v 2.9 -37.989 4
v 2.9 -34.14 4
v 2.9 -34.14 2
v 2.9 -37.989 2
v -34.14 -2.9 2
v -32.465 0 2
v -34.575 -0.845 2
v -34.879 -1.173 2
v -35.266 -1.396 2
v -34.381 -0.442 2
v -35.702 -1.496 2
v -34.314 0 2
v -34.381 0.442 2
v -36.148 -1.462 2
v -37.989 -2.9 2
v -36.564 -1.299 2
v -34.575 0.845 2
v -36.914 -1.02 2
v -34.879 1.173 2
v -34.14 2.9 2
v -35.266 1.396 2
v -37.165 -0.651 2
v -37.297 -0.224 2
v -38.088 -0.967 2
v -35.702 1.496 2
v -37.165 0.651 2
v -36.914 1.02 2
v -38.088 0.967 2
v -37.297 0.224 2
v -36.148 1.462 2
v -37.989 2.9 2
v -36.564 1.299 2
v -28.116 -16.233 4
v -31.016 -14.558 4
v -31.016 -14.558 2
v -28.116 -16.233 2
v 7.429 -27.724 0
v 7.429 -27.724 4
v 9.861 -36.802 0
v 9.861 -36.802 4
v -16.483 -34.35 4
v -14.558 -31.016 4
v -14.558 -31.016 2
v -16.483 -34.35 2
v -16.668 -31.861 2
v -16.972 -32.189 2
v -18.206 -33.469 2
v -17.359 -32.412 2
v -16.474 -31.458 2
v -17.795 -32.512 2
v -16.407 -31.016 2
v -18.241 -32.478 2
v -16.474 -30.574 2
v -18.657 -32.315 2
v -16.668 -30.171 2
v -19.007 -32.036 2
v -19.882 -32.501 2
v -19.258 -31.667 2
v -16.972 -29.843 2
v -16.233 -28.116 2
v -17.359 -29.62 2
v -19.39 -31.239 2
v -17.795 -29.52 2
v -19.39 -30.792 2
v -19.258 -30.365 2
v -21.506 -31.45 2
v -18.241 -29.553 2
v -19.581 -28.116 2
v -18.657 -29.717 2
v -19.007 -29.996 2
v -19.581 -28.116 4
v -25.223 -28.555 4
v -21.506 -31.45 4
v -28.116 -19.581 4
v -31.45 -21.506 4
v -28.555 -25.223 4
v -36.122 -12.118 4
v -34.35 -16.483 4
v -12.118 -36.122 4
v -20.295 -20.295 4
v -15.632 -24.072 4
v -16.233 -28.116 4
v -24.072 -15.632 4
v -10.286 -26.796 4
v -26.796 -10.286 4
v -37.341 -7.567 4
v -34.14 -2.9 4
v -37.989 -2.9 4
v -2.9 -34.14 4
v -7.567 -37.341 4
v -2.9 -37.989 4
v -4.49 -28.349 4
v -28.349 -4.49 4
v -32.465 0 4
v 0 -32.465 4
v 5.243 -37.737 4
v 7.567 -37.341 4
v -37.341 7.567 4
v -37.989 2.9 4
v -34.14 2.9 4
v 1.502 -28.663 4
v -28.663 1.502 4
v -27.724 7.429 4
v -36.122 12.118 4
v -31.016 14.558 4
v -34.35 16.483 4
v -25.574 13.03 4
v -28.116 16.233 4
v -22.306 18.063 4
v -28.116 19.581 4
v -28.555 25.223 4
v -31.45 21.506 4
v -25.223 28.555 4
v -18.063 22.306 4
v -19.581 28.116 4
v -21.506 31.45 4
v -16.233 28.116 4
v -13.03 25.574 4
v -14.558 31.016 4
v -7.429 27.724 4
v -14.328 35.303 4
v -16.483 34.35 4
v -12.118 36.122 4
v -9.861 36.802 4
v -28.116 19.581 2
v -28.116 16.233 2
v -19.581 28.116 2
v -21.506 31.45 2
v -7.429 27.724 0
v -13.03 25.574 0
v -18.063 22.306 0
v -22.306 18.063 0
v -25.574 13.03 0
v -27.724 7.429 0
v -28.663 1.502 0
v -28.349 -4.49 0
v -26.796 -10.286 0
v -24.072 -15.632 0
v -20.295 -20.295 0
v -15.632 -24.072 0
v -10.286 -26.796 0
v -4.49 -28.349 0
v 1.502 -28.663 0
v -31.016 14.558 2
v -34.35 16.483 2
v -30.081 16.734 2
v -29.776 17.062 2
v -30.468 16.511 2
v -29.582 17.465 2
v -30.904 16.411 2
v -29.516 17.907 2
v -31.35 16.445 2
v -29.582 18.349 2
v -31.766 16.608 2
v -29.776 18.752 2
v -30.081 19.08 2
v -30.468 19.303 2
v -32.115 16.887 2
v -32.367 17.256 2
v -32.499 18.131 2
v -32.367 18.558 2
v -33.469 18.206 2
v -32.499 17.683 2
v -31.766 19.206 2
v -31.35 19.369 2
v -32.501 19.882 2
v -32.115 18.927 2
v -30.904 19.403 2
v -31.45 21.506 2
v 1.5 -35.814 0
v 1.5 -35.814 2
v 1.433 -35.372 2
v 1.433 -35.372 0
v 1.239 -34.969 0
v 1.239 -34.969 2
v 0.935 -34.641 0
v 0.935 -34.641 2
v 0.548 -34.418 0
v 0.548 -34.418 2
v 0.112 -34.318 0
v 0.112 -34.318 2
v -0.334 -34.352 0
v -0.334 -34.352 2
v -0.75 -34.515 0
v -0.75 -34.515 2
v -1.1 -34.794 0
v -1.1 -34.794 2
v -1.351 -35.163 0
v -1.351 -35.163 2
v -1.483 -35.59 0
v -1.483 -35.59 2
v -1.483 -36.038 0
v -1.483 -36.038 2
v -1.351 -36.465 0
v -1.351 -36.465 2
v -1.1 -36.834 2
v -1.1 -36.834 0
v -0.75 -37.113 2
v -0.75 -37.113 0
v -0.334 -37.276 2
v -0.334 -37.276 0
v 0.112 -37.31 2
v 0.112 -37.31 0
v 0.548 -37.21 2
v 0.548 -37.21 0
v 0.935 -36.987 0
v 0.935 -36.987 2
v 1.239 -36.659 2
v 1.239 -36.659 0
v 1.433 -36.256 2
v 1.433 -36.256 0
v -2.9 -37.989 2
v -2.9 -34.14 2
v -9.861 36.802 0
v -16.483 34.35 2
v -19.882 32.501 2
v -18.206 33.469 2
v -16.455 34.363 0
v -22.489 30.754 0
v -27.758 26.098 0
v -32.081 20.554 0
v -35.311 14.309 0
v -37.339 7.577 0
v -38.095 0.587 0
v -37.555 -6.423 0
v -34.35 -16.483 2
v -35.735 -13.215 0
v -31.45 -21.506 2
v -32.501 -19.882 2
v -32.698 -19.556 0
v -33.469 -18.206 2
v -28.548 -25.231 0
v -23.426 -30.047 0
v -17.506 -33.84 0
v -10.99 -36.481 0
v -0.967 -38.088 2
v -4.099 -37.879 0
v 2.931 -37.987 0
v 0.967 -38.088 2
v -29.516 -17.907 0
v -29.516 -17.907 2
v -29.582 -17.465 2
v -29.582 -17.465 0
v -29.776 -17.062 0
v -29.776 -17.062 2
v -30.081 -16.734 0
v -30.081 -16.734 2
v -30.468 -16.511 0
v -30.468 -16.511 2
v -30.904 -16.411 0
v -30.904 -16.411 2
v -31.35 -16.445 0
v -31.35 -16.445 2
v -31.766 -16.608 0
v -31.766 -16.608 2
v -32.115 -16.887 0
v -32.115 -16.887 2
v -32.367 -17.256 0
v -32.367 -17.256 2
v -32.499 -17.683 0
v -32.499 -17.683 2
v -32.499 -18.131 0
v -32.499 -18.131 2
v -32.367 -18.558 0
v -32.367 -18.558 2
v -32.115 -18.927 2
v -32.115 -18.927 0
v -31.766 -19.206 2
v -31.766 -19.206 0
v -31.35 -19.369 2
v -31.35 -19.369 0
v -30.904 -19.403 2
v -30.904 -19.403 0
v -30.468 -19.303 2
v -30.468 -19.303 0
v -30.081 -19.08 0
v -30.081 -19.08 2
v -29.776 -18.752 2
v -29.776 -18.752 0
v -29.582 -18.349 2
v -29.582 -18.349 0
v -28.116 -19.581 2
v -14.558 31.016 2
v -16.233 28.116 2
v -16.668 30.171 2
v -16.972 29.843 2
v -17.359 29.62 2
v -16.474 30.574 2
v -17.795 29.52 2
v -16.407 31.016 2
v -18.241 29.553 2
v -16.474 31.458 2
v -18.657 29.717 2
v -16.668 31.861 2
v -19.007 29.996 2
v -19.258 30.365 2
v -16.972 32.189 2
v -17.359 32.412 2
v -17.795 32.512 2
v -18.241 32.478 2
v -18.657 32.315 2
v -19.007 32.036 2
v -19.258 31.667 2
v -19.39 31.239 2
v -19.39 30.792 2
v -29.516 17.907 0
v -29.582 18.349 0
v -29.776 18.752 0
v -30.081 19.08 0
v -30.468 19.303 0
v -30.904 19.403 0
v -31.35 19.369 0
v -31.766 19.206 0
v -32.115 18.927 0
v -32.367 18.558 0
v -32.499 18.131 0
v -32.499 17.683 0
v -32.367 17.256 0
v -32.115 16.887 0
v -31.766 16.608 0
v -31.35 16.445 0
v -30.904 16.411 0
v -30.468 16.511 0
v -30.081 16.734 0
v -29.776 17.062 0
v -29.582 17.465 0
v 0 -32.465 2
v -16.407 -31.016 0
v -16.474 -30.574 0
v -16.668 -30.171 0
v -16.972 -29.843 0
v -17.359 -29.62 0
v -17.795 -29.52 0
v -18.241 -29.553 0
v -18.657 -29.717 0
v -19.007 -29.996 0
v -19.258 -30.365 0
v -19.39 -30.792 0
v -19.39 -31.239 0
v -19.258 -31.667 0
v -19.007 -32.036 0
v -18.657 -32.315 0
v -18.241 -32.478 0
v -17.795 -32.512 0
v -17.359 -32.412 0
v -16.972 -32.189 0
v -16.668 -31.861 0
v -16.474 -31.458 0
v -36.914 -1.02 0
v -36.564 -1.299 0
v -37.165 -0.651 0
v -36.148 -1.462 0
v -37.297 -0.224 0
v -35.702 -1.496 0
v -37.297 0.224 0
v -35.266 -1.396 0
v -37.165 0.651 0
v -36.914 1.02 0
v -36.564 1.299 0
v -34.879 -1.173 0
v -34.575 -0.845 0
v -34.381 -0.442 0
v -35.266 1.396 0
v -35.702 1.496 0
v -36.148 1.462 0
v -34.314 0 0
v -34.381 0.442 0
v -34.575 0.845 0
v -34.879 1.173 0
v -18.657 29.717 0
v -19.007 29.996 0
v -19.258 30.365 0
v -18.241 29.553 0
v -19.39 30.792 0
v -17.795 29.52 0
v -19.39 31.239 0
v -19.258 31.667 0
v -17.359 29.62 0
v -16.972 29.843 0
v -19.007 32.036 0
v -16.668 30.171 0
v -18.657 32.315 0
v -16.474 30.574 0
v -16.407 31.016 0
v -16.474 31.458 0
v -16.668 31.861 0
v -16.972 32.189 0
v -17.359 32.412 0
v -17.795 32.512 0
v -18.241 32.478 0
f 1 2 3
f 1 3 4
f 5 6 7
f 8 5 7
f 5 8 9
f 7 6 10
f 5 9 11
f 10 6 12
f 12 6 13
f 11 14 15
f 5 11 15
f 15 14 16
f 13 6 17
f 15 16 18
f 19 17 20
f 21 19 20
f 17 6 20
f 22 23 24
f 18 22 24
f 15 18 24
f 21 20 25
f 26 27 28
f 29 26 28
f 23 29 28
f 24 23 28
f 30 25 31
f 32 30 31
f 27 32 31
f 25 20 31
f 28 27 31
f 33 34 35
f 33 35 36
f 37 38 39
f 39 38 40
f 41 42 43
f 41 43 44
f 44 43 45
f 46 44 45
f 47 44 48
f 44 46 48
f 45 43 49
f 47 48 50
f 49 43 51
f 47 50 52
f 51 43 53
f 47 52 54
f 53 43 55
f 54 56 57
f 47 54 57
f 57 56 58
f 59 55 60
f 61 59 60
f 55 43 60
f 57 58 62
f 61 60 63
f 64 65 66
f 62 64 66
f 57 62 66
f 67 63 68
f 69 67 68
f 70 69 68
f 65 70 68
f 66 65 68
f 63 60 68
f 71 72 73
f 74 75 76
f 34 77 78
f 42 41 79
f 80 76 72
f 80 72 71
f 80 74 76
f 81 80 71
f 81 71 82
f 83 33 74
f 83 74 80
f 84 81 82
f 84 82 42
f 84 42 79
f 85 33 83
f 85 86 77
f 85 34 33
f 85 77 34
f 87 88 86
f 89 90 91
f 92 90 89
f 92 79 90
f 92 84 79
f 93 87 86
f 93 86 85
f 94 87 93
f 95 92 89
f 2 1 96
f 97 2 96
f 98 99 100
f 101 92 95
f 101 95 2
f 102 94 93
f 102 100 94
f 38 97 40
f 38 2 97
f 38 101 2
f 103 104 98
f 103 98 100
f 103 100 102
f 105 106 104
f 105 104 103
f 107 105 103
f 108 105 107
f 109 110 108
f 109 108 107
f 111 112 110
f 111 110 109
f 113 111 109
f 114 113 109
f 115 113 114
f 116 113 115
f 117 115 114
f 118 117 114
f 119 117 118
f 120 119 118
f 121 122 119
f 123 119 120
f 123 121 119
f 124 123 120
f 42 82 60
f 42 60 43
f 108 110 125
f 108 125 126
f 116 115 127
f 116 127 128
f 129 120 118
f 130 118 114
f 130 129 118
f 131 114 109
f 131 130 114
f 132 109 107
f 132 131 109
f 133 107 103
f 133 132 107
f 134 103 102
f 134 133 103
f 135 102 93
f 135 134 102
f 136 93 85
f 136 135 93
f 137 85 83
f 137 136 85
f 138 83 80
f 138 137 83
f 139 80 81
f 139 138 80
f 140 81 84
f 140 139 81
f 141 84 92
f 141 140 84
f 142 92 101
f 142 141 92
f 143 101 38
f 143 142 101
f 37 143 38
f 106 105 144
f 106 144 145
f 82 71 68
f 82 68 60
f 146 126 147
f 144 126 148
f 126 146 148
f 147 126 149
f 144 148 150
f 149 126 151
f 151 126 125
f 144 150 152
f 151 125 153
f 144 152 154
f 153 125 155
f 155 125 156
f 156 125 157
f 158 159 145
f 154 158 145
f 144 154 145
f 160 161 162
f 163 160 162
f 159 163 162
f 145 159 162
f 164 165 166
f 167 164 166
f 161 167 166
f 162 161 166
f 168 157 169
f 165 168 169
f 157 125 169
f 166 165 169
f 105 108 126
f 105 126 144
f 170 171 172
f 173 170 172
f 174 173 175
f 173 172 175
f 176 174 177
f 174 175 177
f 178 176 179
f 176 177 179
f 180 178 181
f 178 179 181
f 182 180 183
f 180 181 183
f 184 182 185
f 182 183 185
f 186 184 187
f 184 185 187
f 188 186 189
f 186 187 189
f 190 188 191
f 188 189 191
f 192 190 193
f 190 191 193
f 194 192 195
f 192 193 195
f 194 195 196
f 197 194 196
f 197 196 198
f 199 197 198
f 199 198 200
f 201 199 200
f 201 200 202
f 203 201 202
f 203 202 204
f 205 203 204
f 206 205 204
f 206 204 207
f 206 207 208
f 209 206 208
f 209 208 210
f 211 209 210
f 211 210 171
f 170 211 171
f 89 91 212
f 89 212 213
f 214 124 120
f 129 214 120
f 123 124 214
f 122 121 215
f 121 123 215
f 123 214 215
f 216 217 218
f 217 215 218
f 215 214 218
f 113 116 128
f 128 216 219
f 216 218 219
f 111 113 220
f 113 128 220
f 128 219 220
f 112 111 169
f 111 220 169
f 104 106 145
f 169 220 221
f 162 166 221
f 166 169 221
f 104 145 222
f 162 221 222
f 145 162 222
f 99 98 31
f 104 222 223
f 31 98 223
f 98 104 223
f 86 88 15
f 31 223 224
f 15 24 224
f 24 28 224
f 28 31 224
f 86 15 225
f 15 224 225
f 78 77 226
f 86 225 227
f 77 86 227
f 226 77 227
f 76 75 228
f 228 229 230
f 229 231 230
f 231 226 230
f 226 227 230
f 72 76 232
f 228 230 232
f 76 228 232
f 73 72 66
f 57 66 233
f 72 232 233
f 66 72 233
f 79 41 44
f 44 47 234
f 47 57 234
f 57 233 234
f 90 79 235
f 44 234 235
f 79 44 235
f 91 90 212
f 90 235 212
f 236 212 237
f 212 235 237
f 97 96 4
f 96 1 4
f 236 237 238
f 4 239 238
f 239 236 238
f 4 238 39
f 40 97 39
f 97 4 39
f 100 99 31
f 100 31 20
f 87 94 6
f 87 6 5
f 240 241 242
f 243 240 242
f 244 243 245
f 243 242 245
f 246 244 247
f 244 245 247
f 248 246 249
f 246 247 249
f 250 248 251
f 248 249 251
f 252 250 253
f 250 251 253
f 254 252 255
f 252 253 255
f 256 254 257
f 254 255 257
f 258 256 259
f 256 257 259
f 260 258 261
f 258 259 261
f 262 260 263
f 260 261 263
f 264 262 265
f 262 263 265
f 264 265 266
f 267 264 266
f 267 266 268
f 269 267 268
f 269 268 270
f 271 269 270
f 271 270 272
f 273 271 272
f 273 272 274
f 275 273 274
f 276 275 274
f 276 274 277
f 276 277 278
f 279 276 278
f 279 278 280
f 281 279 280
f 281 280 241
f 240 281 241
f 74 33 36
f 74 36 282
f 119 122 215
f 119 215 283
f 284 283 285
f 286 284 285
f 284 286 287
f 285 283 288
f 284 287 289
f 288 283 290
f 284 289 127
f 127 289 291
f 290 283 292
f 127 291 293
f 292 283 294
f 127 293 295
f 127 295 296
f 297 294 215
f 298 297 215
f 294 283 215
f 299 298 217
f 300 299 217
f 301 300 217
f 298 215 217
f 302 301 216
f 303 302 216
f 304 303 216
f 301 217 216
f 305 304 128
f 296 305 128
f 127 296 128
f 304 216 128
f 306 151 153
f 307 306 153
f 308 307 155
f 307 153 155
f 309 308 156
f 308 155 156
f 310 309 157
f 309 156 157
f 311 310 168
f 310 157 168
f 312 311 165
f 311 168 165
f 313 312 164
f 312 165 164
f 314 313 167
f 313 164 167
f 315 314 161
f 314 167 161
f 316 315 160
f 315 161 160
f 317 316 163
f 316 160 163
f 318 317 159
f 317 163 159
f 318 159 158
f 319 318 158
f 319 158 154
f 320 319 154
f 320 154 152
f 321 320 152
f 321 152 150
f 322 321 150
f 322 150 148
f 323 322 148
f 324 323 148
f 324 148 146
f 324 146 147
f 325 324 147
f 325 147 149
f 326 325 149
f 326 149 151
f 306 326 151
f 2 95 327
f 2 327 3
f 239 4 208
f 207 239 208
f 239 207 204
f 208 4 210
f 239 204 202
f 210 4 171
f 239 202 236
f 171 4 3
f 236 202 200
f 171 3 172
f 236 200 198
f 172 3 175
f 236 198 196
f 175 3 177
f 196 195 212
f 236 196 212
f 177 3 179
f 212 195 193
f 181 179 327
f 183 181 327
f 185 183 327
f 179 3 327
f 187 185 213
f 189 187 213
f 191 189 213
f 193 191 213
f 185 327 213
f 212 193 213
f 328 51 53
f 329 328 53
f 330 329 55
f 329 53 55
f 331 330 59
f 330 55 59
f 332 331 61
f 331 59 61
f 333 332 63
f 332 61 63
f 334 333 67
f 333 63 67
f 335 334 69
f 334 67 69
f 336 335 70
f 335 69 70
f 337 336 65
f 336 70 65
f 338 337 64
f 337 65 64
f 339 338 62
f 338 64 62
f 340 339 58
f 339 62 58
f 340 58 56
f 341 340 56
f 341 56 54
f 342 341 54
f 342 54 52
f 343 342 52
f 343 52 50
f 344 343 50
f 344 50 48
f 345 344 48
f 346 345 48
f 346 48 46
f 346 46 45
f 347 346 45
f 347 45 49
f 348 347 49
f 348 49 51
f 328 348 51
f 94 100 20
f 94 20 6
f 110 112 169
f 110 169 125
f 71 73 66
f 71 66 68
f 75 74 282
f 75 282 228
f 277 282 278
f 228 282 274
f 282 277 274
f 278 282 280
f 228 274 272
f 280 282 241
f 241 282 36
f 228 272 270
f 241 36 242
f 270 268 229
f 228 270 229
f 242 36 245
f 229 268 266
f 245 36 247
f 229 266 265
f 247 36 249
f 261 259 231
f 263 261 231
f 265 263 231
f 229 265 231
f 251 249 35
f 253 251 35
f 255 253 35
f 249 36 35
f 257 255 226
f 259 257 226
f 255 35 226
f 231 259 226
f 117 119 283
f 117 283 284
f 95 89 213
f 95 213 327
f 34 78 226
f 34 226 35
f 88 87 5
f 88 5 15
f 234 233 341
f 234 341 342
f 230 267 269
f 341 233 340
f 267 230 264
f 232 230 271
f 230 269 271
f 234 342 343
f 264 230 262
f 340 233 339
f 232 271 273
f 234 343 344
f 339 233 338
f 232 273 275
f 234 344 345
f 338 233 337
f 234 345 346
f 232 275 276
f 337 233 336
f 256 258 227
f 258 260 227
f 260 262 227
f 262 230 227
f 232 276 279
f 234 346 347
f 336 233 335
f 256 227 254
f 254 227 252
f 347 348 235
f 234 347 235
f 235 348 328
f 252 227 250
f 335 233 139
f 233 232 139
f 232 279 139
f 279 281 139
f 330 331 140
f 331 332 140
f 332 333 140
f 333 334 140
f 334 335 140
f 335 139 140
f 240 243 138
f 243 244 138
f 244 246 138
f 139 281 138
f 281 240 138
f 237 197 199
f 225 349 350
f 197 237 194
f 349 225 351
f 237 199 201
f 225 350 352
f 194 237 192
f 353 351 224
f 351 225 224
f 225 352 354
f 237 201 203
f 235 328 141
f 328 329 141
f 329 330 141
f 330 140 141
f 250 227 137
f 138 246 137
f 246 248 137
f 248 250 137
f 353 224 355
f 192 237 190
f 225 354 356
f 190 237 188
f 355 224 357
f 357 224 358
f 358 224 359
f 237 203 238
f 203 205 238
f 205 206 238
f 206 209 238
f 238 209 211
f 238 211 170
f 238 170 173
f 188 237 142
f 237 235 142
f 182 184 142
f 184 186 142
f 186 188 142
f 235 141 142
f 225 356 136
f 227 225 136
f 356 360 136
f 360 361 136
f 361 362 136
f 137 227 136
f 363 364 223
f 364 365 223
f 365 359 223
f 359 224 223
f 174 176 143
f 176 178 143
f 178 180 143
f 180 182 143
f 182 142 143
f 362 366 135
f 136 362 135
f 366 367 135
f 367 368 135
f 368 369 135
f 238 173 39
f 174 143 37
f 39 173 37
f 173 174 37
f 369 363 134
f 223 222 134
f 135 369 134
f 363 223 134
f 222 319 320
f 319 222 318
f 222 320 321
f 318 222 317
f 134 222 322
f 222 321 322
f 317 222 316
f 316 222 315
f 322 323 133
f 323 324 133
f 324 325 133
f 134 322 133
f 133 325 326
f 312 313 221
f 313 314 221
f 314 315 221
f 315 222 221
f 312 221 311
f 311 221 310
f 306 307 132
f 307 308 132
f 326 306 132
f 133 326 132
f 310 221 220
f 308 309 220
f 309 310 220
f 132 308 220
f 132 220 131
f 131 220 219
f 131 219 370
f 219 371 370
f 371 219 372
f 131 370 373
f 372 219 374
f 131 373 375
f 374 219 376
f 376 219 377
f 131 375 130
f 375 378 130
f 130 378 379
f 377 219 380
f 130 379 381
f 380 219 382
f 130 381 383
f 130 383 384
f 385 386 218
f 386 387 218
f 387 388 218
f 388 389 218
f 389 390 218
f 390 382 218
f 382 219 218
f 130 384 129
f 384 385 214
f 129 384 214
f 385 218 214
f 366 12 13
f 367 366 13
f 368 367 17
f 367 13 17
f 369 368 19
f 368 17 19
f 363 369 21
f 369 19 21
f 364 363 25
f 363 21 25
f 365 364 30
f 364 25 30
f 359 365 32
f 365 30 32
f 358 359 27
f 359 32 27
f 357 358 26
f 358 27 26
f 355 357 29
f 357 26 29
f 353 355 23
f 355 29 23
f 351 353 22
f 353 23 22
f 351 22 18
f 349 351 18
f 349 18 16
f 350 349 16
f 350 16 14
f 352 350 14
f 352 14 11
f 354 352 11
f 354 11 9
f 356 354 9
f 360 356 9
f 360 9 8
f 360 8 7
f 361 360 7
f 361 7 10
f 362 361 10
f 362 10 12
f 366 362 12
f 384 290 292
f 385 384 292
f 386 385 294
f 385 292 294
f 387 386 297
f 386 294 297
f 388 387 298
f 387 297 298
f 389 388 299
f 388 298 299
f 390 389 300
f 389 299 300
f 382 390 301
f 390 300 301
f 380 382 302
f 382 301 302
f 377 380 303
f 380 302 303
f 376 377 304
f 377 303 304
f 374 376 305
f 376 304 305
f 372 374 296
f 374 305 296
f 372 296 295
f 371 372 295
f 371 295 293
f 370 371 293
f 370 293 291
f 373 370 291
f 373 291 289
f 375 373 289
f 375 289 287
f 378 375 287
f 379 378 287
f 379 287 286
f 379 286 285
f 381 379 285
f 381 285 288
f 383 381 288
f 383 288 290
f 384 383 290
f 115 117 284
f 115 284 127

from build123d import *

# Parameters (mm, degrees)
SKETCH1_R               = 38.1
SKETCH1_R_2             = 28.702
BOSS_EXTRUDE1_DEPTH     = 4
SKETCH2_R               = 1.5
CUT_EXTRUDE1_DEPTH      = 5
CUT_EXTRUDE2_DEPTH      = 2
CUT_EXTRUDE3_DEPTH      = 1
CUT_EXTRUDE3_DEPTH_BACK = 5


with BuildPart() as part:
    # Sketch1 → Boss-Extrude1 (new body)
    with BuildSketch(Plane.XY):
        Circle(SKETCH1_R)
        Circle(SKETCH1_R_2, mode=Mode.SUBTRACT)
    extrude(amount=BOSS_EXTRUDE1_DEPTH)

    # Sketch2 → Cut-Extrude1 (cut, through all)
    with BuildSketch(Plane.XY.offset(4)):
        with Locations((0, 35.814)):
            Circle(SKETCH2_R)
        with Locations((17.907, 31.015833811)):
            Circle(SKETCH2_R)
        with Locations((31.015833811, 17.907)):
            Circle(SKETCH2_R)
        with Locations((35.814, 0)):
            Circle(SKETCH2_R)
        with Locations((31.015833811, -17.907)):
            Circle(SKETCH2_R)
        with Locations((17.907, -31.015833811)):
            Circle(SKETCH2_R)
        with Locations((0, -35.814)):
            Circle(SKETCH2_R)
        with Locations((-17.907, -31.015833811)):
            Circle(SKETCH2_R)
        with Locations((-31.015833811, -17.907)):
            Circle(SKETCH2_R)
        with Locations((-35.814, 0)):
            Circle(SKETCH2_R)
        with Locations((-31.015833811, 17.907)):
            Circle(SKETCH2_R)
        with Locations((-17.907, 31.015833811)):
            Circle(SKETCH2_R)
    extrude(amount=-CUT_EXTRUDE1_DEPTH, mode=Mode.SUBTRACT)

    # Sketch3 → Cut-Extrude2 (cut)
    with BuildSketch(Plane.XY.offset(4)):
        Polygon((-2.9, 37.989472226), (0, 39.162631561), (2.9, 37.989472226), (2.9, 34.139684219), (0, 32.465368439), (-2.9, 34.139684219), align=None)
        Polygon((16.483262442, 34.349848024), (19.581315781, 33.915833811), (21.506209784, 31.449848024), (19.581315781, 28.115833811), (16.232684219, 28.115833811), (14.558368439, 31.015833811), align=None)
        Polygon((31.449848024, 21.506209784), (33.915833811, 19.581315781), (34.349848024, 16.483262442), (31.015833811, 14.558368439), (28.115833811, 16.232684219), (28.115833811, 19.581315781), align=None)
        Polygon((37.989472226, 2.9), (39.162631561, 0), (37.989472226, -2.9), (34.139684219, -2.9), (32.465368439, 0), (34.139684219, 2.9), align=None)
        Polygon((34.349848024, -16.483262442), (33.915833811, -19.581315781), (31.449848024, -21.506209784), (28.115833811, -19.581315781), (28.115833811, -16.232684219), (31.015833811, -14.558368439), align=None)
        Polygon((21.506209784, -31.449848024), (19.581315781, -33.915833811), (16.483262442, -34.349848024), (14.558368439, -31.015833811), (16.232684219, -28.115833811), (19.581315781, -28.115833811), align=None)
        Polygon((2.9, -37.989472226), (0, -39.162631561), (-2.9, -37.989472226), (-2.9, -34.139684219), (0, -32.465368439), (2.9, -34.139684219), align=None)
        Polygon((-16.483262442, -34.349848024), (-19.581315781, -33.915833811), (-21.506209784, -31.449848024), (-19.581315781, -28.115833811), (-16.232684219, -28.115833811), (-14.558368439, -31.015833811), align=None)
        Polygon((-31.449848024, -21.506209784), (-33.915833811, -19.581315781), (-34.349848024, -16.483262442), (-31.015833811, -14.558368439), (-28.115833811, -16.232684219), (-28.115833811, -19.581315781), align=None)
        Polygon((-37.989472226, -2.9), (-39.162631561, 0), (-37.989472226, 2.9), (-34.139684219, 2.9), (-32.465368439, 0), (-34.139684219, -2.9), align=None)
        Polygon((-34.349848024, 16.483262442), (-33.915833811, 19.581315781), (-31.449848024, 21.506209784), (-28.115833811, 19.581315781), (-28.115833811, 16.232684219), (-31.015833811, 14.558368439), align=None)
        Polygon((-21.506209784, 31.449848024), (-19.581315781, 33.915833811), (-16.483262442, 34.349848024), (-14.558368439, 31.015833811), (-16.232684219, 28.115833811), (-19.581315781, 28.115833811), align=None)
    extrude(amount=-CUT_EXTRUDE2_DEPTH, mode=Mode.SUBTRACT)

    # Sketch4 → Cut-Extrude3 (cut, two sides)
    with BuildSketch(Plane.XY.offset(4)) as cut_extrude3_sk:
        with BuildLine():
            Line((-9.861005618, 36.801773982), (9.861005618, -36.801773982))
            ThreePointArc((9.861005618, -36.801773982), (36.801773982, 9.861005618), (-9.861005618, 36.801773982))
        make_face()
    extrude(amount=CUT_EXTRUDE3_DEPTH, mode=Mode.SUBTRACT)
    extrude(cut_extrude3_sk.sketch, amount=-CUT_EXTRUDE3_DEPTH_BACK, mode=Mode.SUBTRACT)


solid = part.part
